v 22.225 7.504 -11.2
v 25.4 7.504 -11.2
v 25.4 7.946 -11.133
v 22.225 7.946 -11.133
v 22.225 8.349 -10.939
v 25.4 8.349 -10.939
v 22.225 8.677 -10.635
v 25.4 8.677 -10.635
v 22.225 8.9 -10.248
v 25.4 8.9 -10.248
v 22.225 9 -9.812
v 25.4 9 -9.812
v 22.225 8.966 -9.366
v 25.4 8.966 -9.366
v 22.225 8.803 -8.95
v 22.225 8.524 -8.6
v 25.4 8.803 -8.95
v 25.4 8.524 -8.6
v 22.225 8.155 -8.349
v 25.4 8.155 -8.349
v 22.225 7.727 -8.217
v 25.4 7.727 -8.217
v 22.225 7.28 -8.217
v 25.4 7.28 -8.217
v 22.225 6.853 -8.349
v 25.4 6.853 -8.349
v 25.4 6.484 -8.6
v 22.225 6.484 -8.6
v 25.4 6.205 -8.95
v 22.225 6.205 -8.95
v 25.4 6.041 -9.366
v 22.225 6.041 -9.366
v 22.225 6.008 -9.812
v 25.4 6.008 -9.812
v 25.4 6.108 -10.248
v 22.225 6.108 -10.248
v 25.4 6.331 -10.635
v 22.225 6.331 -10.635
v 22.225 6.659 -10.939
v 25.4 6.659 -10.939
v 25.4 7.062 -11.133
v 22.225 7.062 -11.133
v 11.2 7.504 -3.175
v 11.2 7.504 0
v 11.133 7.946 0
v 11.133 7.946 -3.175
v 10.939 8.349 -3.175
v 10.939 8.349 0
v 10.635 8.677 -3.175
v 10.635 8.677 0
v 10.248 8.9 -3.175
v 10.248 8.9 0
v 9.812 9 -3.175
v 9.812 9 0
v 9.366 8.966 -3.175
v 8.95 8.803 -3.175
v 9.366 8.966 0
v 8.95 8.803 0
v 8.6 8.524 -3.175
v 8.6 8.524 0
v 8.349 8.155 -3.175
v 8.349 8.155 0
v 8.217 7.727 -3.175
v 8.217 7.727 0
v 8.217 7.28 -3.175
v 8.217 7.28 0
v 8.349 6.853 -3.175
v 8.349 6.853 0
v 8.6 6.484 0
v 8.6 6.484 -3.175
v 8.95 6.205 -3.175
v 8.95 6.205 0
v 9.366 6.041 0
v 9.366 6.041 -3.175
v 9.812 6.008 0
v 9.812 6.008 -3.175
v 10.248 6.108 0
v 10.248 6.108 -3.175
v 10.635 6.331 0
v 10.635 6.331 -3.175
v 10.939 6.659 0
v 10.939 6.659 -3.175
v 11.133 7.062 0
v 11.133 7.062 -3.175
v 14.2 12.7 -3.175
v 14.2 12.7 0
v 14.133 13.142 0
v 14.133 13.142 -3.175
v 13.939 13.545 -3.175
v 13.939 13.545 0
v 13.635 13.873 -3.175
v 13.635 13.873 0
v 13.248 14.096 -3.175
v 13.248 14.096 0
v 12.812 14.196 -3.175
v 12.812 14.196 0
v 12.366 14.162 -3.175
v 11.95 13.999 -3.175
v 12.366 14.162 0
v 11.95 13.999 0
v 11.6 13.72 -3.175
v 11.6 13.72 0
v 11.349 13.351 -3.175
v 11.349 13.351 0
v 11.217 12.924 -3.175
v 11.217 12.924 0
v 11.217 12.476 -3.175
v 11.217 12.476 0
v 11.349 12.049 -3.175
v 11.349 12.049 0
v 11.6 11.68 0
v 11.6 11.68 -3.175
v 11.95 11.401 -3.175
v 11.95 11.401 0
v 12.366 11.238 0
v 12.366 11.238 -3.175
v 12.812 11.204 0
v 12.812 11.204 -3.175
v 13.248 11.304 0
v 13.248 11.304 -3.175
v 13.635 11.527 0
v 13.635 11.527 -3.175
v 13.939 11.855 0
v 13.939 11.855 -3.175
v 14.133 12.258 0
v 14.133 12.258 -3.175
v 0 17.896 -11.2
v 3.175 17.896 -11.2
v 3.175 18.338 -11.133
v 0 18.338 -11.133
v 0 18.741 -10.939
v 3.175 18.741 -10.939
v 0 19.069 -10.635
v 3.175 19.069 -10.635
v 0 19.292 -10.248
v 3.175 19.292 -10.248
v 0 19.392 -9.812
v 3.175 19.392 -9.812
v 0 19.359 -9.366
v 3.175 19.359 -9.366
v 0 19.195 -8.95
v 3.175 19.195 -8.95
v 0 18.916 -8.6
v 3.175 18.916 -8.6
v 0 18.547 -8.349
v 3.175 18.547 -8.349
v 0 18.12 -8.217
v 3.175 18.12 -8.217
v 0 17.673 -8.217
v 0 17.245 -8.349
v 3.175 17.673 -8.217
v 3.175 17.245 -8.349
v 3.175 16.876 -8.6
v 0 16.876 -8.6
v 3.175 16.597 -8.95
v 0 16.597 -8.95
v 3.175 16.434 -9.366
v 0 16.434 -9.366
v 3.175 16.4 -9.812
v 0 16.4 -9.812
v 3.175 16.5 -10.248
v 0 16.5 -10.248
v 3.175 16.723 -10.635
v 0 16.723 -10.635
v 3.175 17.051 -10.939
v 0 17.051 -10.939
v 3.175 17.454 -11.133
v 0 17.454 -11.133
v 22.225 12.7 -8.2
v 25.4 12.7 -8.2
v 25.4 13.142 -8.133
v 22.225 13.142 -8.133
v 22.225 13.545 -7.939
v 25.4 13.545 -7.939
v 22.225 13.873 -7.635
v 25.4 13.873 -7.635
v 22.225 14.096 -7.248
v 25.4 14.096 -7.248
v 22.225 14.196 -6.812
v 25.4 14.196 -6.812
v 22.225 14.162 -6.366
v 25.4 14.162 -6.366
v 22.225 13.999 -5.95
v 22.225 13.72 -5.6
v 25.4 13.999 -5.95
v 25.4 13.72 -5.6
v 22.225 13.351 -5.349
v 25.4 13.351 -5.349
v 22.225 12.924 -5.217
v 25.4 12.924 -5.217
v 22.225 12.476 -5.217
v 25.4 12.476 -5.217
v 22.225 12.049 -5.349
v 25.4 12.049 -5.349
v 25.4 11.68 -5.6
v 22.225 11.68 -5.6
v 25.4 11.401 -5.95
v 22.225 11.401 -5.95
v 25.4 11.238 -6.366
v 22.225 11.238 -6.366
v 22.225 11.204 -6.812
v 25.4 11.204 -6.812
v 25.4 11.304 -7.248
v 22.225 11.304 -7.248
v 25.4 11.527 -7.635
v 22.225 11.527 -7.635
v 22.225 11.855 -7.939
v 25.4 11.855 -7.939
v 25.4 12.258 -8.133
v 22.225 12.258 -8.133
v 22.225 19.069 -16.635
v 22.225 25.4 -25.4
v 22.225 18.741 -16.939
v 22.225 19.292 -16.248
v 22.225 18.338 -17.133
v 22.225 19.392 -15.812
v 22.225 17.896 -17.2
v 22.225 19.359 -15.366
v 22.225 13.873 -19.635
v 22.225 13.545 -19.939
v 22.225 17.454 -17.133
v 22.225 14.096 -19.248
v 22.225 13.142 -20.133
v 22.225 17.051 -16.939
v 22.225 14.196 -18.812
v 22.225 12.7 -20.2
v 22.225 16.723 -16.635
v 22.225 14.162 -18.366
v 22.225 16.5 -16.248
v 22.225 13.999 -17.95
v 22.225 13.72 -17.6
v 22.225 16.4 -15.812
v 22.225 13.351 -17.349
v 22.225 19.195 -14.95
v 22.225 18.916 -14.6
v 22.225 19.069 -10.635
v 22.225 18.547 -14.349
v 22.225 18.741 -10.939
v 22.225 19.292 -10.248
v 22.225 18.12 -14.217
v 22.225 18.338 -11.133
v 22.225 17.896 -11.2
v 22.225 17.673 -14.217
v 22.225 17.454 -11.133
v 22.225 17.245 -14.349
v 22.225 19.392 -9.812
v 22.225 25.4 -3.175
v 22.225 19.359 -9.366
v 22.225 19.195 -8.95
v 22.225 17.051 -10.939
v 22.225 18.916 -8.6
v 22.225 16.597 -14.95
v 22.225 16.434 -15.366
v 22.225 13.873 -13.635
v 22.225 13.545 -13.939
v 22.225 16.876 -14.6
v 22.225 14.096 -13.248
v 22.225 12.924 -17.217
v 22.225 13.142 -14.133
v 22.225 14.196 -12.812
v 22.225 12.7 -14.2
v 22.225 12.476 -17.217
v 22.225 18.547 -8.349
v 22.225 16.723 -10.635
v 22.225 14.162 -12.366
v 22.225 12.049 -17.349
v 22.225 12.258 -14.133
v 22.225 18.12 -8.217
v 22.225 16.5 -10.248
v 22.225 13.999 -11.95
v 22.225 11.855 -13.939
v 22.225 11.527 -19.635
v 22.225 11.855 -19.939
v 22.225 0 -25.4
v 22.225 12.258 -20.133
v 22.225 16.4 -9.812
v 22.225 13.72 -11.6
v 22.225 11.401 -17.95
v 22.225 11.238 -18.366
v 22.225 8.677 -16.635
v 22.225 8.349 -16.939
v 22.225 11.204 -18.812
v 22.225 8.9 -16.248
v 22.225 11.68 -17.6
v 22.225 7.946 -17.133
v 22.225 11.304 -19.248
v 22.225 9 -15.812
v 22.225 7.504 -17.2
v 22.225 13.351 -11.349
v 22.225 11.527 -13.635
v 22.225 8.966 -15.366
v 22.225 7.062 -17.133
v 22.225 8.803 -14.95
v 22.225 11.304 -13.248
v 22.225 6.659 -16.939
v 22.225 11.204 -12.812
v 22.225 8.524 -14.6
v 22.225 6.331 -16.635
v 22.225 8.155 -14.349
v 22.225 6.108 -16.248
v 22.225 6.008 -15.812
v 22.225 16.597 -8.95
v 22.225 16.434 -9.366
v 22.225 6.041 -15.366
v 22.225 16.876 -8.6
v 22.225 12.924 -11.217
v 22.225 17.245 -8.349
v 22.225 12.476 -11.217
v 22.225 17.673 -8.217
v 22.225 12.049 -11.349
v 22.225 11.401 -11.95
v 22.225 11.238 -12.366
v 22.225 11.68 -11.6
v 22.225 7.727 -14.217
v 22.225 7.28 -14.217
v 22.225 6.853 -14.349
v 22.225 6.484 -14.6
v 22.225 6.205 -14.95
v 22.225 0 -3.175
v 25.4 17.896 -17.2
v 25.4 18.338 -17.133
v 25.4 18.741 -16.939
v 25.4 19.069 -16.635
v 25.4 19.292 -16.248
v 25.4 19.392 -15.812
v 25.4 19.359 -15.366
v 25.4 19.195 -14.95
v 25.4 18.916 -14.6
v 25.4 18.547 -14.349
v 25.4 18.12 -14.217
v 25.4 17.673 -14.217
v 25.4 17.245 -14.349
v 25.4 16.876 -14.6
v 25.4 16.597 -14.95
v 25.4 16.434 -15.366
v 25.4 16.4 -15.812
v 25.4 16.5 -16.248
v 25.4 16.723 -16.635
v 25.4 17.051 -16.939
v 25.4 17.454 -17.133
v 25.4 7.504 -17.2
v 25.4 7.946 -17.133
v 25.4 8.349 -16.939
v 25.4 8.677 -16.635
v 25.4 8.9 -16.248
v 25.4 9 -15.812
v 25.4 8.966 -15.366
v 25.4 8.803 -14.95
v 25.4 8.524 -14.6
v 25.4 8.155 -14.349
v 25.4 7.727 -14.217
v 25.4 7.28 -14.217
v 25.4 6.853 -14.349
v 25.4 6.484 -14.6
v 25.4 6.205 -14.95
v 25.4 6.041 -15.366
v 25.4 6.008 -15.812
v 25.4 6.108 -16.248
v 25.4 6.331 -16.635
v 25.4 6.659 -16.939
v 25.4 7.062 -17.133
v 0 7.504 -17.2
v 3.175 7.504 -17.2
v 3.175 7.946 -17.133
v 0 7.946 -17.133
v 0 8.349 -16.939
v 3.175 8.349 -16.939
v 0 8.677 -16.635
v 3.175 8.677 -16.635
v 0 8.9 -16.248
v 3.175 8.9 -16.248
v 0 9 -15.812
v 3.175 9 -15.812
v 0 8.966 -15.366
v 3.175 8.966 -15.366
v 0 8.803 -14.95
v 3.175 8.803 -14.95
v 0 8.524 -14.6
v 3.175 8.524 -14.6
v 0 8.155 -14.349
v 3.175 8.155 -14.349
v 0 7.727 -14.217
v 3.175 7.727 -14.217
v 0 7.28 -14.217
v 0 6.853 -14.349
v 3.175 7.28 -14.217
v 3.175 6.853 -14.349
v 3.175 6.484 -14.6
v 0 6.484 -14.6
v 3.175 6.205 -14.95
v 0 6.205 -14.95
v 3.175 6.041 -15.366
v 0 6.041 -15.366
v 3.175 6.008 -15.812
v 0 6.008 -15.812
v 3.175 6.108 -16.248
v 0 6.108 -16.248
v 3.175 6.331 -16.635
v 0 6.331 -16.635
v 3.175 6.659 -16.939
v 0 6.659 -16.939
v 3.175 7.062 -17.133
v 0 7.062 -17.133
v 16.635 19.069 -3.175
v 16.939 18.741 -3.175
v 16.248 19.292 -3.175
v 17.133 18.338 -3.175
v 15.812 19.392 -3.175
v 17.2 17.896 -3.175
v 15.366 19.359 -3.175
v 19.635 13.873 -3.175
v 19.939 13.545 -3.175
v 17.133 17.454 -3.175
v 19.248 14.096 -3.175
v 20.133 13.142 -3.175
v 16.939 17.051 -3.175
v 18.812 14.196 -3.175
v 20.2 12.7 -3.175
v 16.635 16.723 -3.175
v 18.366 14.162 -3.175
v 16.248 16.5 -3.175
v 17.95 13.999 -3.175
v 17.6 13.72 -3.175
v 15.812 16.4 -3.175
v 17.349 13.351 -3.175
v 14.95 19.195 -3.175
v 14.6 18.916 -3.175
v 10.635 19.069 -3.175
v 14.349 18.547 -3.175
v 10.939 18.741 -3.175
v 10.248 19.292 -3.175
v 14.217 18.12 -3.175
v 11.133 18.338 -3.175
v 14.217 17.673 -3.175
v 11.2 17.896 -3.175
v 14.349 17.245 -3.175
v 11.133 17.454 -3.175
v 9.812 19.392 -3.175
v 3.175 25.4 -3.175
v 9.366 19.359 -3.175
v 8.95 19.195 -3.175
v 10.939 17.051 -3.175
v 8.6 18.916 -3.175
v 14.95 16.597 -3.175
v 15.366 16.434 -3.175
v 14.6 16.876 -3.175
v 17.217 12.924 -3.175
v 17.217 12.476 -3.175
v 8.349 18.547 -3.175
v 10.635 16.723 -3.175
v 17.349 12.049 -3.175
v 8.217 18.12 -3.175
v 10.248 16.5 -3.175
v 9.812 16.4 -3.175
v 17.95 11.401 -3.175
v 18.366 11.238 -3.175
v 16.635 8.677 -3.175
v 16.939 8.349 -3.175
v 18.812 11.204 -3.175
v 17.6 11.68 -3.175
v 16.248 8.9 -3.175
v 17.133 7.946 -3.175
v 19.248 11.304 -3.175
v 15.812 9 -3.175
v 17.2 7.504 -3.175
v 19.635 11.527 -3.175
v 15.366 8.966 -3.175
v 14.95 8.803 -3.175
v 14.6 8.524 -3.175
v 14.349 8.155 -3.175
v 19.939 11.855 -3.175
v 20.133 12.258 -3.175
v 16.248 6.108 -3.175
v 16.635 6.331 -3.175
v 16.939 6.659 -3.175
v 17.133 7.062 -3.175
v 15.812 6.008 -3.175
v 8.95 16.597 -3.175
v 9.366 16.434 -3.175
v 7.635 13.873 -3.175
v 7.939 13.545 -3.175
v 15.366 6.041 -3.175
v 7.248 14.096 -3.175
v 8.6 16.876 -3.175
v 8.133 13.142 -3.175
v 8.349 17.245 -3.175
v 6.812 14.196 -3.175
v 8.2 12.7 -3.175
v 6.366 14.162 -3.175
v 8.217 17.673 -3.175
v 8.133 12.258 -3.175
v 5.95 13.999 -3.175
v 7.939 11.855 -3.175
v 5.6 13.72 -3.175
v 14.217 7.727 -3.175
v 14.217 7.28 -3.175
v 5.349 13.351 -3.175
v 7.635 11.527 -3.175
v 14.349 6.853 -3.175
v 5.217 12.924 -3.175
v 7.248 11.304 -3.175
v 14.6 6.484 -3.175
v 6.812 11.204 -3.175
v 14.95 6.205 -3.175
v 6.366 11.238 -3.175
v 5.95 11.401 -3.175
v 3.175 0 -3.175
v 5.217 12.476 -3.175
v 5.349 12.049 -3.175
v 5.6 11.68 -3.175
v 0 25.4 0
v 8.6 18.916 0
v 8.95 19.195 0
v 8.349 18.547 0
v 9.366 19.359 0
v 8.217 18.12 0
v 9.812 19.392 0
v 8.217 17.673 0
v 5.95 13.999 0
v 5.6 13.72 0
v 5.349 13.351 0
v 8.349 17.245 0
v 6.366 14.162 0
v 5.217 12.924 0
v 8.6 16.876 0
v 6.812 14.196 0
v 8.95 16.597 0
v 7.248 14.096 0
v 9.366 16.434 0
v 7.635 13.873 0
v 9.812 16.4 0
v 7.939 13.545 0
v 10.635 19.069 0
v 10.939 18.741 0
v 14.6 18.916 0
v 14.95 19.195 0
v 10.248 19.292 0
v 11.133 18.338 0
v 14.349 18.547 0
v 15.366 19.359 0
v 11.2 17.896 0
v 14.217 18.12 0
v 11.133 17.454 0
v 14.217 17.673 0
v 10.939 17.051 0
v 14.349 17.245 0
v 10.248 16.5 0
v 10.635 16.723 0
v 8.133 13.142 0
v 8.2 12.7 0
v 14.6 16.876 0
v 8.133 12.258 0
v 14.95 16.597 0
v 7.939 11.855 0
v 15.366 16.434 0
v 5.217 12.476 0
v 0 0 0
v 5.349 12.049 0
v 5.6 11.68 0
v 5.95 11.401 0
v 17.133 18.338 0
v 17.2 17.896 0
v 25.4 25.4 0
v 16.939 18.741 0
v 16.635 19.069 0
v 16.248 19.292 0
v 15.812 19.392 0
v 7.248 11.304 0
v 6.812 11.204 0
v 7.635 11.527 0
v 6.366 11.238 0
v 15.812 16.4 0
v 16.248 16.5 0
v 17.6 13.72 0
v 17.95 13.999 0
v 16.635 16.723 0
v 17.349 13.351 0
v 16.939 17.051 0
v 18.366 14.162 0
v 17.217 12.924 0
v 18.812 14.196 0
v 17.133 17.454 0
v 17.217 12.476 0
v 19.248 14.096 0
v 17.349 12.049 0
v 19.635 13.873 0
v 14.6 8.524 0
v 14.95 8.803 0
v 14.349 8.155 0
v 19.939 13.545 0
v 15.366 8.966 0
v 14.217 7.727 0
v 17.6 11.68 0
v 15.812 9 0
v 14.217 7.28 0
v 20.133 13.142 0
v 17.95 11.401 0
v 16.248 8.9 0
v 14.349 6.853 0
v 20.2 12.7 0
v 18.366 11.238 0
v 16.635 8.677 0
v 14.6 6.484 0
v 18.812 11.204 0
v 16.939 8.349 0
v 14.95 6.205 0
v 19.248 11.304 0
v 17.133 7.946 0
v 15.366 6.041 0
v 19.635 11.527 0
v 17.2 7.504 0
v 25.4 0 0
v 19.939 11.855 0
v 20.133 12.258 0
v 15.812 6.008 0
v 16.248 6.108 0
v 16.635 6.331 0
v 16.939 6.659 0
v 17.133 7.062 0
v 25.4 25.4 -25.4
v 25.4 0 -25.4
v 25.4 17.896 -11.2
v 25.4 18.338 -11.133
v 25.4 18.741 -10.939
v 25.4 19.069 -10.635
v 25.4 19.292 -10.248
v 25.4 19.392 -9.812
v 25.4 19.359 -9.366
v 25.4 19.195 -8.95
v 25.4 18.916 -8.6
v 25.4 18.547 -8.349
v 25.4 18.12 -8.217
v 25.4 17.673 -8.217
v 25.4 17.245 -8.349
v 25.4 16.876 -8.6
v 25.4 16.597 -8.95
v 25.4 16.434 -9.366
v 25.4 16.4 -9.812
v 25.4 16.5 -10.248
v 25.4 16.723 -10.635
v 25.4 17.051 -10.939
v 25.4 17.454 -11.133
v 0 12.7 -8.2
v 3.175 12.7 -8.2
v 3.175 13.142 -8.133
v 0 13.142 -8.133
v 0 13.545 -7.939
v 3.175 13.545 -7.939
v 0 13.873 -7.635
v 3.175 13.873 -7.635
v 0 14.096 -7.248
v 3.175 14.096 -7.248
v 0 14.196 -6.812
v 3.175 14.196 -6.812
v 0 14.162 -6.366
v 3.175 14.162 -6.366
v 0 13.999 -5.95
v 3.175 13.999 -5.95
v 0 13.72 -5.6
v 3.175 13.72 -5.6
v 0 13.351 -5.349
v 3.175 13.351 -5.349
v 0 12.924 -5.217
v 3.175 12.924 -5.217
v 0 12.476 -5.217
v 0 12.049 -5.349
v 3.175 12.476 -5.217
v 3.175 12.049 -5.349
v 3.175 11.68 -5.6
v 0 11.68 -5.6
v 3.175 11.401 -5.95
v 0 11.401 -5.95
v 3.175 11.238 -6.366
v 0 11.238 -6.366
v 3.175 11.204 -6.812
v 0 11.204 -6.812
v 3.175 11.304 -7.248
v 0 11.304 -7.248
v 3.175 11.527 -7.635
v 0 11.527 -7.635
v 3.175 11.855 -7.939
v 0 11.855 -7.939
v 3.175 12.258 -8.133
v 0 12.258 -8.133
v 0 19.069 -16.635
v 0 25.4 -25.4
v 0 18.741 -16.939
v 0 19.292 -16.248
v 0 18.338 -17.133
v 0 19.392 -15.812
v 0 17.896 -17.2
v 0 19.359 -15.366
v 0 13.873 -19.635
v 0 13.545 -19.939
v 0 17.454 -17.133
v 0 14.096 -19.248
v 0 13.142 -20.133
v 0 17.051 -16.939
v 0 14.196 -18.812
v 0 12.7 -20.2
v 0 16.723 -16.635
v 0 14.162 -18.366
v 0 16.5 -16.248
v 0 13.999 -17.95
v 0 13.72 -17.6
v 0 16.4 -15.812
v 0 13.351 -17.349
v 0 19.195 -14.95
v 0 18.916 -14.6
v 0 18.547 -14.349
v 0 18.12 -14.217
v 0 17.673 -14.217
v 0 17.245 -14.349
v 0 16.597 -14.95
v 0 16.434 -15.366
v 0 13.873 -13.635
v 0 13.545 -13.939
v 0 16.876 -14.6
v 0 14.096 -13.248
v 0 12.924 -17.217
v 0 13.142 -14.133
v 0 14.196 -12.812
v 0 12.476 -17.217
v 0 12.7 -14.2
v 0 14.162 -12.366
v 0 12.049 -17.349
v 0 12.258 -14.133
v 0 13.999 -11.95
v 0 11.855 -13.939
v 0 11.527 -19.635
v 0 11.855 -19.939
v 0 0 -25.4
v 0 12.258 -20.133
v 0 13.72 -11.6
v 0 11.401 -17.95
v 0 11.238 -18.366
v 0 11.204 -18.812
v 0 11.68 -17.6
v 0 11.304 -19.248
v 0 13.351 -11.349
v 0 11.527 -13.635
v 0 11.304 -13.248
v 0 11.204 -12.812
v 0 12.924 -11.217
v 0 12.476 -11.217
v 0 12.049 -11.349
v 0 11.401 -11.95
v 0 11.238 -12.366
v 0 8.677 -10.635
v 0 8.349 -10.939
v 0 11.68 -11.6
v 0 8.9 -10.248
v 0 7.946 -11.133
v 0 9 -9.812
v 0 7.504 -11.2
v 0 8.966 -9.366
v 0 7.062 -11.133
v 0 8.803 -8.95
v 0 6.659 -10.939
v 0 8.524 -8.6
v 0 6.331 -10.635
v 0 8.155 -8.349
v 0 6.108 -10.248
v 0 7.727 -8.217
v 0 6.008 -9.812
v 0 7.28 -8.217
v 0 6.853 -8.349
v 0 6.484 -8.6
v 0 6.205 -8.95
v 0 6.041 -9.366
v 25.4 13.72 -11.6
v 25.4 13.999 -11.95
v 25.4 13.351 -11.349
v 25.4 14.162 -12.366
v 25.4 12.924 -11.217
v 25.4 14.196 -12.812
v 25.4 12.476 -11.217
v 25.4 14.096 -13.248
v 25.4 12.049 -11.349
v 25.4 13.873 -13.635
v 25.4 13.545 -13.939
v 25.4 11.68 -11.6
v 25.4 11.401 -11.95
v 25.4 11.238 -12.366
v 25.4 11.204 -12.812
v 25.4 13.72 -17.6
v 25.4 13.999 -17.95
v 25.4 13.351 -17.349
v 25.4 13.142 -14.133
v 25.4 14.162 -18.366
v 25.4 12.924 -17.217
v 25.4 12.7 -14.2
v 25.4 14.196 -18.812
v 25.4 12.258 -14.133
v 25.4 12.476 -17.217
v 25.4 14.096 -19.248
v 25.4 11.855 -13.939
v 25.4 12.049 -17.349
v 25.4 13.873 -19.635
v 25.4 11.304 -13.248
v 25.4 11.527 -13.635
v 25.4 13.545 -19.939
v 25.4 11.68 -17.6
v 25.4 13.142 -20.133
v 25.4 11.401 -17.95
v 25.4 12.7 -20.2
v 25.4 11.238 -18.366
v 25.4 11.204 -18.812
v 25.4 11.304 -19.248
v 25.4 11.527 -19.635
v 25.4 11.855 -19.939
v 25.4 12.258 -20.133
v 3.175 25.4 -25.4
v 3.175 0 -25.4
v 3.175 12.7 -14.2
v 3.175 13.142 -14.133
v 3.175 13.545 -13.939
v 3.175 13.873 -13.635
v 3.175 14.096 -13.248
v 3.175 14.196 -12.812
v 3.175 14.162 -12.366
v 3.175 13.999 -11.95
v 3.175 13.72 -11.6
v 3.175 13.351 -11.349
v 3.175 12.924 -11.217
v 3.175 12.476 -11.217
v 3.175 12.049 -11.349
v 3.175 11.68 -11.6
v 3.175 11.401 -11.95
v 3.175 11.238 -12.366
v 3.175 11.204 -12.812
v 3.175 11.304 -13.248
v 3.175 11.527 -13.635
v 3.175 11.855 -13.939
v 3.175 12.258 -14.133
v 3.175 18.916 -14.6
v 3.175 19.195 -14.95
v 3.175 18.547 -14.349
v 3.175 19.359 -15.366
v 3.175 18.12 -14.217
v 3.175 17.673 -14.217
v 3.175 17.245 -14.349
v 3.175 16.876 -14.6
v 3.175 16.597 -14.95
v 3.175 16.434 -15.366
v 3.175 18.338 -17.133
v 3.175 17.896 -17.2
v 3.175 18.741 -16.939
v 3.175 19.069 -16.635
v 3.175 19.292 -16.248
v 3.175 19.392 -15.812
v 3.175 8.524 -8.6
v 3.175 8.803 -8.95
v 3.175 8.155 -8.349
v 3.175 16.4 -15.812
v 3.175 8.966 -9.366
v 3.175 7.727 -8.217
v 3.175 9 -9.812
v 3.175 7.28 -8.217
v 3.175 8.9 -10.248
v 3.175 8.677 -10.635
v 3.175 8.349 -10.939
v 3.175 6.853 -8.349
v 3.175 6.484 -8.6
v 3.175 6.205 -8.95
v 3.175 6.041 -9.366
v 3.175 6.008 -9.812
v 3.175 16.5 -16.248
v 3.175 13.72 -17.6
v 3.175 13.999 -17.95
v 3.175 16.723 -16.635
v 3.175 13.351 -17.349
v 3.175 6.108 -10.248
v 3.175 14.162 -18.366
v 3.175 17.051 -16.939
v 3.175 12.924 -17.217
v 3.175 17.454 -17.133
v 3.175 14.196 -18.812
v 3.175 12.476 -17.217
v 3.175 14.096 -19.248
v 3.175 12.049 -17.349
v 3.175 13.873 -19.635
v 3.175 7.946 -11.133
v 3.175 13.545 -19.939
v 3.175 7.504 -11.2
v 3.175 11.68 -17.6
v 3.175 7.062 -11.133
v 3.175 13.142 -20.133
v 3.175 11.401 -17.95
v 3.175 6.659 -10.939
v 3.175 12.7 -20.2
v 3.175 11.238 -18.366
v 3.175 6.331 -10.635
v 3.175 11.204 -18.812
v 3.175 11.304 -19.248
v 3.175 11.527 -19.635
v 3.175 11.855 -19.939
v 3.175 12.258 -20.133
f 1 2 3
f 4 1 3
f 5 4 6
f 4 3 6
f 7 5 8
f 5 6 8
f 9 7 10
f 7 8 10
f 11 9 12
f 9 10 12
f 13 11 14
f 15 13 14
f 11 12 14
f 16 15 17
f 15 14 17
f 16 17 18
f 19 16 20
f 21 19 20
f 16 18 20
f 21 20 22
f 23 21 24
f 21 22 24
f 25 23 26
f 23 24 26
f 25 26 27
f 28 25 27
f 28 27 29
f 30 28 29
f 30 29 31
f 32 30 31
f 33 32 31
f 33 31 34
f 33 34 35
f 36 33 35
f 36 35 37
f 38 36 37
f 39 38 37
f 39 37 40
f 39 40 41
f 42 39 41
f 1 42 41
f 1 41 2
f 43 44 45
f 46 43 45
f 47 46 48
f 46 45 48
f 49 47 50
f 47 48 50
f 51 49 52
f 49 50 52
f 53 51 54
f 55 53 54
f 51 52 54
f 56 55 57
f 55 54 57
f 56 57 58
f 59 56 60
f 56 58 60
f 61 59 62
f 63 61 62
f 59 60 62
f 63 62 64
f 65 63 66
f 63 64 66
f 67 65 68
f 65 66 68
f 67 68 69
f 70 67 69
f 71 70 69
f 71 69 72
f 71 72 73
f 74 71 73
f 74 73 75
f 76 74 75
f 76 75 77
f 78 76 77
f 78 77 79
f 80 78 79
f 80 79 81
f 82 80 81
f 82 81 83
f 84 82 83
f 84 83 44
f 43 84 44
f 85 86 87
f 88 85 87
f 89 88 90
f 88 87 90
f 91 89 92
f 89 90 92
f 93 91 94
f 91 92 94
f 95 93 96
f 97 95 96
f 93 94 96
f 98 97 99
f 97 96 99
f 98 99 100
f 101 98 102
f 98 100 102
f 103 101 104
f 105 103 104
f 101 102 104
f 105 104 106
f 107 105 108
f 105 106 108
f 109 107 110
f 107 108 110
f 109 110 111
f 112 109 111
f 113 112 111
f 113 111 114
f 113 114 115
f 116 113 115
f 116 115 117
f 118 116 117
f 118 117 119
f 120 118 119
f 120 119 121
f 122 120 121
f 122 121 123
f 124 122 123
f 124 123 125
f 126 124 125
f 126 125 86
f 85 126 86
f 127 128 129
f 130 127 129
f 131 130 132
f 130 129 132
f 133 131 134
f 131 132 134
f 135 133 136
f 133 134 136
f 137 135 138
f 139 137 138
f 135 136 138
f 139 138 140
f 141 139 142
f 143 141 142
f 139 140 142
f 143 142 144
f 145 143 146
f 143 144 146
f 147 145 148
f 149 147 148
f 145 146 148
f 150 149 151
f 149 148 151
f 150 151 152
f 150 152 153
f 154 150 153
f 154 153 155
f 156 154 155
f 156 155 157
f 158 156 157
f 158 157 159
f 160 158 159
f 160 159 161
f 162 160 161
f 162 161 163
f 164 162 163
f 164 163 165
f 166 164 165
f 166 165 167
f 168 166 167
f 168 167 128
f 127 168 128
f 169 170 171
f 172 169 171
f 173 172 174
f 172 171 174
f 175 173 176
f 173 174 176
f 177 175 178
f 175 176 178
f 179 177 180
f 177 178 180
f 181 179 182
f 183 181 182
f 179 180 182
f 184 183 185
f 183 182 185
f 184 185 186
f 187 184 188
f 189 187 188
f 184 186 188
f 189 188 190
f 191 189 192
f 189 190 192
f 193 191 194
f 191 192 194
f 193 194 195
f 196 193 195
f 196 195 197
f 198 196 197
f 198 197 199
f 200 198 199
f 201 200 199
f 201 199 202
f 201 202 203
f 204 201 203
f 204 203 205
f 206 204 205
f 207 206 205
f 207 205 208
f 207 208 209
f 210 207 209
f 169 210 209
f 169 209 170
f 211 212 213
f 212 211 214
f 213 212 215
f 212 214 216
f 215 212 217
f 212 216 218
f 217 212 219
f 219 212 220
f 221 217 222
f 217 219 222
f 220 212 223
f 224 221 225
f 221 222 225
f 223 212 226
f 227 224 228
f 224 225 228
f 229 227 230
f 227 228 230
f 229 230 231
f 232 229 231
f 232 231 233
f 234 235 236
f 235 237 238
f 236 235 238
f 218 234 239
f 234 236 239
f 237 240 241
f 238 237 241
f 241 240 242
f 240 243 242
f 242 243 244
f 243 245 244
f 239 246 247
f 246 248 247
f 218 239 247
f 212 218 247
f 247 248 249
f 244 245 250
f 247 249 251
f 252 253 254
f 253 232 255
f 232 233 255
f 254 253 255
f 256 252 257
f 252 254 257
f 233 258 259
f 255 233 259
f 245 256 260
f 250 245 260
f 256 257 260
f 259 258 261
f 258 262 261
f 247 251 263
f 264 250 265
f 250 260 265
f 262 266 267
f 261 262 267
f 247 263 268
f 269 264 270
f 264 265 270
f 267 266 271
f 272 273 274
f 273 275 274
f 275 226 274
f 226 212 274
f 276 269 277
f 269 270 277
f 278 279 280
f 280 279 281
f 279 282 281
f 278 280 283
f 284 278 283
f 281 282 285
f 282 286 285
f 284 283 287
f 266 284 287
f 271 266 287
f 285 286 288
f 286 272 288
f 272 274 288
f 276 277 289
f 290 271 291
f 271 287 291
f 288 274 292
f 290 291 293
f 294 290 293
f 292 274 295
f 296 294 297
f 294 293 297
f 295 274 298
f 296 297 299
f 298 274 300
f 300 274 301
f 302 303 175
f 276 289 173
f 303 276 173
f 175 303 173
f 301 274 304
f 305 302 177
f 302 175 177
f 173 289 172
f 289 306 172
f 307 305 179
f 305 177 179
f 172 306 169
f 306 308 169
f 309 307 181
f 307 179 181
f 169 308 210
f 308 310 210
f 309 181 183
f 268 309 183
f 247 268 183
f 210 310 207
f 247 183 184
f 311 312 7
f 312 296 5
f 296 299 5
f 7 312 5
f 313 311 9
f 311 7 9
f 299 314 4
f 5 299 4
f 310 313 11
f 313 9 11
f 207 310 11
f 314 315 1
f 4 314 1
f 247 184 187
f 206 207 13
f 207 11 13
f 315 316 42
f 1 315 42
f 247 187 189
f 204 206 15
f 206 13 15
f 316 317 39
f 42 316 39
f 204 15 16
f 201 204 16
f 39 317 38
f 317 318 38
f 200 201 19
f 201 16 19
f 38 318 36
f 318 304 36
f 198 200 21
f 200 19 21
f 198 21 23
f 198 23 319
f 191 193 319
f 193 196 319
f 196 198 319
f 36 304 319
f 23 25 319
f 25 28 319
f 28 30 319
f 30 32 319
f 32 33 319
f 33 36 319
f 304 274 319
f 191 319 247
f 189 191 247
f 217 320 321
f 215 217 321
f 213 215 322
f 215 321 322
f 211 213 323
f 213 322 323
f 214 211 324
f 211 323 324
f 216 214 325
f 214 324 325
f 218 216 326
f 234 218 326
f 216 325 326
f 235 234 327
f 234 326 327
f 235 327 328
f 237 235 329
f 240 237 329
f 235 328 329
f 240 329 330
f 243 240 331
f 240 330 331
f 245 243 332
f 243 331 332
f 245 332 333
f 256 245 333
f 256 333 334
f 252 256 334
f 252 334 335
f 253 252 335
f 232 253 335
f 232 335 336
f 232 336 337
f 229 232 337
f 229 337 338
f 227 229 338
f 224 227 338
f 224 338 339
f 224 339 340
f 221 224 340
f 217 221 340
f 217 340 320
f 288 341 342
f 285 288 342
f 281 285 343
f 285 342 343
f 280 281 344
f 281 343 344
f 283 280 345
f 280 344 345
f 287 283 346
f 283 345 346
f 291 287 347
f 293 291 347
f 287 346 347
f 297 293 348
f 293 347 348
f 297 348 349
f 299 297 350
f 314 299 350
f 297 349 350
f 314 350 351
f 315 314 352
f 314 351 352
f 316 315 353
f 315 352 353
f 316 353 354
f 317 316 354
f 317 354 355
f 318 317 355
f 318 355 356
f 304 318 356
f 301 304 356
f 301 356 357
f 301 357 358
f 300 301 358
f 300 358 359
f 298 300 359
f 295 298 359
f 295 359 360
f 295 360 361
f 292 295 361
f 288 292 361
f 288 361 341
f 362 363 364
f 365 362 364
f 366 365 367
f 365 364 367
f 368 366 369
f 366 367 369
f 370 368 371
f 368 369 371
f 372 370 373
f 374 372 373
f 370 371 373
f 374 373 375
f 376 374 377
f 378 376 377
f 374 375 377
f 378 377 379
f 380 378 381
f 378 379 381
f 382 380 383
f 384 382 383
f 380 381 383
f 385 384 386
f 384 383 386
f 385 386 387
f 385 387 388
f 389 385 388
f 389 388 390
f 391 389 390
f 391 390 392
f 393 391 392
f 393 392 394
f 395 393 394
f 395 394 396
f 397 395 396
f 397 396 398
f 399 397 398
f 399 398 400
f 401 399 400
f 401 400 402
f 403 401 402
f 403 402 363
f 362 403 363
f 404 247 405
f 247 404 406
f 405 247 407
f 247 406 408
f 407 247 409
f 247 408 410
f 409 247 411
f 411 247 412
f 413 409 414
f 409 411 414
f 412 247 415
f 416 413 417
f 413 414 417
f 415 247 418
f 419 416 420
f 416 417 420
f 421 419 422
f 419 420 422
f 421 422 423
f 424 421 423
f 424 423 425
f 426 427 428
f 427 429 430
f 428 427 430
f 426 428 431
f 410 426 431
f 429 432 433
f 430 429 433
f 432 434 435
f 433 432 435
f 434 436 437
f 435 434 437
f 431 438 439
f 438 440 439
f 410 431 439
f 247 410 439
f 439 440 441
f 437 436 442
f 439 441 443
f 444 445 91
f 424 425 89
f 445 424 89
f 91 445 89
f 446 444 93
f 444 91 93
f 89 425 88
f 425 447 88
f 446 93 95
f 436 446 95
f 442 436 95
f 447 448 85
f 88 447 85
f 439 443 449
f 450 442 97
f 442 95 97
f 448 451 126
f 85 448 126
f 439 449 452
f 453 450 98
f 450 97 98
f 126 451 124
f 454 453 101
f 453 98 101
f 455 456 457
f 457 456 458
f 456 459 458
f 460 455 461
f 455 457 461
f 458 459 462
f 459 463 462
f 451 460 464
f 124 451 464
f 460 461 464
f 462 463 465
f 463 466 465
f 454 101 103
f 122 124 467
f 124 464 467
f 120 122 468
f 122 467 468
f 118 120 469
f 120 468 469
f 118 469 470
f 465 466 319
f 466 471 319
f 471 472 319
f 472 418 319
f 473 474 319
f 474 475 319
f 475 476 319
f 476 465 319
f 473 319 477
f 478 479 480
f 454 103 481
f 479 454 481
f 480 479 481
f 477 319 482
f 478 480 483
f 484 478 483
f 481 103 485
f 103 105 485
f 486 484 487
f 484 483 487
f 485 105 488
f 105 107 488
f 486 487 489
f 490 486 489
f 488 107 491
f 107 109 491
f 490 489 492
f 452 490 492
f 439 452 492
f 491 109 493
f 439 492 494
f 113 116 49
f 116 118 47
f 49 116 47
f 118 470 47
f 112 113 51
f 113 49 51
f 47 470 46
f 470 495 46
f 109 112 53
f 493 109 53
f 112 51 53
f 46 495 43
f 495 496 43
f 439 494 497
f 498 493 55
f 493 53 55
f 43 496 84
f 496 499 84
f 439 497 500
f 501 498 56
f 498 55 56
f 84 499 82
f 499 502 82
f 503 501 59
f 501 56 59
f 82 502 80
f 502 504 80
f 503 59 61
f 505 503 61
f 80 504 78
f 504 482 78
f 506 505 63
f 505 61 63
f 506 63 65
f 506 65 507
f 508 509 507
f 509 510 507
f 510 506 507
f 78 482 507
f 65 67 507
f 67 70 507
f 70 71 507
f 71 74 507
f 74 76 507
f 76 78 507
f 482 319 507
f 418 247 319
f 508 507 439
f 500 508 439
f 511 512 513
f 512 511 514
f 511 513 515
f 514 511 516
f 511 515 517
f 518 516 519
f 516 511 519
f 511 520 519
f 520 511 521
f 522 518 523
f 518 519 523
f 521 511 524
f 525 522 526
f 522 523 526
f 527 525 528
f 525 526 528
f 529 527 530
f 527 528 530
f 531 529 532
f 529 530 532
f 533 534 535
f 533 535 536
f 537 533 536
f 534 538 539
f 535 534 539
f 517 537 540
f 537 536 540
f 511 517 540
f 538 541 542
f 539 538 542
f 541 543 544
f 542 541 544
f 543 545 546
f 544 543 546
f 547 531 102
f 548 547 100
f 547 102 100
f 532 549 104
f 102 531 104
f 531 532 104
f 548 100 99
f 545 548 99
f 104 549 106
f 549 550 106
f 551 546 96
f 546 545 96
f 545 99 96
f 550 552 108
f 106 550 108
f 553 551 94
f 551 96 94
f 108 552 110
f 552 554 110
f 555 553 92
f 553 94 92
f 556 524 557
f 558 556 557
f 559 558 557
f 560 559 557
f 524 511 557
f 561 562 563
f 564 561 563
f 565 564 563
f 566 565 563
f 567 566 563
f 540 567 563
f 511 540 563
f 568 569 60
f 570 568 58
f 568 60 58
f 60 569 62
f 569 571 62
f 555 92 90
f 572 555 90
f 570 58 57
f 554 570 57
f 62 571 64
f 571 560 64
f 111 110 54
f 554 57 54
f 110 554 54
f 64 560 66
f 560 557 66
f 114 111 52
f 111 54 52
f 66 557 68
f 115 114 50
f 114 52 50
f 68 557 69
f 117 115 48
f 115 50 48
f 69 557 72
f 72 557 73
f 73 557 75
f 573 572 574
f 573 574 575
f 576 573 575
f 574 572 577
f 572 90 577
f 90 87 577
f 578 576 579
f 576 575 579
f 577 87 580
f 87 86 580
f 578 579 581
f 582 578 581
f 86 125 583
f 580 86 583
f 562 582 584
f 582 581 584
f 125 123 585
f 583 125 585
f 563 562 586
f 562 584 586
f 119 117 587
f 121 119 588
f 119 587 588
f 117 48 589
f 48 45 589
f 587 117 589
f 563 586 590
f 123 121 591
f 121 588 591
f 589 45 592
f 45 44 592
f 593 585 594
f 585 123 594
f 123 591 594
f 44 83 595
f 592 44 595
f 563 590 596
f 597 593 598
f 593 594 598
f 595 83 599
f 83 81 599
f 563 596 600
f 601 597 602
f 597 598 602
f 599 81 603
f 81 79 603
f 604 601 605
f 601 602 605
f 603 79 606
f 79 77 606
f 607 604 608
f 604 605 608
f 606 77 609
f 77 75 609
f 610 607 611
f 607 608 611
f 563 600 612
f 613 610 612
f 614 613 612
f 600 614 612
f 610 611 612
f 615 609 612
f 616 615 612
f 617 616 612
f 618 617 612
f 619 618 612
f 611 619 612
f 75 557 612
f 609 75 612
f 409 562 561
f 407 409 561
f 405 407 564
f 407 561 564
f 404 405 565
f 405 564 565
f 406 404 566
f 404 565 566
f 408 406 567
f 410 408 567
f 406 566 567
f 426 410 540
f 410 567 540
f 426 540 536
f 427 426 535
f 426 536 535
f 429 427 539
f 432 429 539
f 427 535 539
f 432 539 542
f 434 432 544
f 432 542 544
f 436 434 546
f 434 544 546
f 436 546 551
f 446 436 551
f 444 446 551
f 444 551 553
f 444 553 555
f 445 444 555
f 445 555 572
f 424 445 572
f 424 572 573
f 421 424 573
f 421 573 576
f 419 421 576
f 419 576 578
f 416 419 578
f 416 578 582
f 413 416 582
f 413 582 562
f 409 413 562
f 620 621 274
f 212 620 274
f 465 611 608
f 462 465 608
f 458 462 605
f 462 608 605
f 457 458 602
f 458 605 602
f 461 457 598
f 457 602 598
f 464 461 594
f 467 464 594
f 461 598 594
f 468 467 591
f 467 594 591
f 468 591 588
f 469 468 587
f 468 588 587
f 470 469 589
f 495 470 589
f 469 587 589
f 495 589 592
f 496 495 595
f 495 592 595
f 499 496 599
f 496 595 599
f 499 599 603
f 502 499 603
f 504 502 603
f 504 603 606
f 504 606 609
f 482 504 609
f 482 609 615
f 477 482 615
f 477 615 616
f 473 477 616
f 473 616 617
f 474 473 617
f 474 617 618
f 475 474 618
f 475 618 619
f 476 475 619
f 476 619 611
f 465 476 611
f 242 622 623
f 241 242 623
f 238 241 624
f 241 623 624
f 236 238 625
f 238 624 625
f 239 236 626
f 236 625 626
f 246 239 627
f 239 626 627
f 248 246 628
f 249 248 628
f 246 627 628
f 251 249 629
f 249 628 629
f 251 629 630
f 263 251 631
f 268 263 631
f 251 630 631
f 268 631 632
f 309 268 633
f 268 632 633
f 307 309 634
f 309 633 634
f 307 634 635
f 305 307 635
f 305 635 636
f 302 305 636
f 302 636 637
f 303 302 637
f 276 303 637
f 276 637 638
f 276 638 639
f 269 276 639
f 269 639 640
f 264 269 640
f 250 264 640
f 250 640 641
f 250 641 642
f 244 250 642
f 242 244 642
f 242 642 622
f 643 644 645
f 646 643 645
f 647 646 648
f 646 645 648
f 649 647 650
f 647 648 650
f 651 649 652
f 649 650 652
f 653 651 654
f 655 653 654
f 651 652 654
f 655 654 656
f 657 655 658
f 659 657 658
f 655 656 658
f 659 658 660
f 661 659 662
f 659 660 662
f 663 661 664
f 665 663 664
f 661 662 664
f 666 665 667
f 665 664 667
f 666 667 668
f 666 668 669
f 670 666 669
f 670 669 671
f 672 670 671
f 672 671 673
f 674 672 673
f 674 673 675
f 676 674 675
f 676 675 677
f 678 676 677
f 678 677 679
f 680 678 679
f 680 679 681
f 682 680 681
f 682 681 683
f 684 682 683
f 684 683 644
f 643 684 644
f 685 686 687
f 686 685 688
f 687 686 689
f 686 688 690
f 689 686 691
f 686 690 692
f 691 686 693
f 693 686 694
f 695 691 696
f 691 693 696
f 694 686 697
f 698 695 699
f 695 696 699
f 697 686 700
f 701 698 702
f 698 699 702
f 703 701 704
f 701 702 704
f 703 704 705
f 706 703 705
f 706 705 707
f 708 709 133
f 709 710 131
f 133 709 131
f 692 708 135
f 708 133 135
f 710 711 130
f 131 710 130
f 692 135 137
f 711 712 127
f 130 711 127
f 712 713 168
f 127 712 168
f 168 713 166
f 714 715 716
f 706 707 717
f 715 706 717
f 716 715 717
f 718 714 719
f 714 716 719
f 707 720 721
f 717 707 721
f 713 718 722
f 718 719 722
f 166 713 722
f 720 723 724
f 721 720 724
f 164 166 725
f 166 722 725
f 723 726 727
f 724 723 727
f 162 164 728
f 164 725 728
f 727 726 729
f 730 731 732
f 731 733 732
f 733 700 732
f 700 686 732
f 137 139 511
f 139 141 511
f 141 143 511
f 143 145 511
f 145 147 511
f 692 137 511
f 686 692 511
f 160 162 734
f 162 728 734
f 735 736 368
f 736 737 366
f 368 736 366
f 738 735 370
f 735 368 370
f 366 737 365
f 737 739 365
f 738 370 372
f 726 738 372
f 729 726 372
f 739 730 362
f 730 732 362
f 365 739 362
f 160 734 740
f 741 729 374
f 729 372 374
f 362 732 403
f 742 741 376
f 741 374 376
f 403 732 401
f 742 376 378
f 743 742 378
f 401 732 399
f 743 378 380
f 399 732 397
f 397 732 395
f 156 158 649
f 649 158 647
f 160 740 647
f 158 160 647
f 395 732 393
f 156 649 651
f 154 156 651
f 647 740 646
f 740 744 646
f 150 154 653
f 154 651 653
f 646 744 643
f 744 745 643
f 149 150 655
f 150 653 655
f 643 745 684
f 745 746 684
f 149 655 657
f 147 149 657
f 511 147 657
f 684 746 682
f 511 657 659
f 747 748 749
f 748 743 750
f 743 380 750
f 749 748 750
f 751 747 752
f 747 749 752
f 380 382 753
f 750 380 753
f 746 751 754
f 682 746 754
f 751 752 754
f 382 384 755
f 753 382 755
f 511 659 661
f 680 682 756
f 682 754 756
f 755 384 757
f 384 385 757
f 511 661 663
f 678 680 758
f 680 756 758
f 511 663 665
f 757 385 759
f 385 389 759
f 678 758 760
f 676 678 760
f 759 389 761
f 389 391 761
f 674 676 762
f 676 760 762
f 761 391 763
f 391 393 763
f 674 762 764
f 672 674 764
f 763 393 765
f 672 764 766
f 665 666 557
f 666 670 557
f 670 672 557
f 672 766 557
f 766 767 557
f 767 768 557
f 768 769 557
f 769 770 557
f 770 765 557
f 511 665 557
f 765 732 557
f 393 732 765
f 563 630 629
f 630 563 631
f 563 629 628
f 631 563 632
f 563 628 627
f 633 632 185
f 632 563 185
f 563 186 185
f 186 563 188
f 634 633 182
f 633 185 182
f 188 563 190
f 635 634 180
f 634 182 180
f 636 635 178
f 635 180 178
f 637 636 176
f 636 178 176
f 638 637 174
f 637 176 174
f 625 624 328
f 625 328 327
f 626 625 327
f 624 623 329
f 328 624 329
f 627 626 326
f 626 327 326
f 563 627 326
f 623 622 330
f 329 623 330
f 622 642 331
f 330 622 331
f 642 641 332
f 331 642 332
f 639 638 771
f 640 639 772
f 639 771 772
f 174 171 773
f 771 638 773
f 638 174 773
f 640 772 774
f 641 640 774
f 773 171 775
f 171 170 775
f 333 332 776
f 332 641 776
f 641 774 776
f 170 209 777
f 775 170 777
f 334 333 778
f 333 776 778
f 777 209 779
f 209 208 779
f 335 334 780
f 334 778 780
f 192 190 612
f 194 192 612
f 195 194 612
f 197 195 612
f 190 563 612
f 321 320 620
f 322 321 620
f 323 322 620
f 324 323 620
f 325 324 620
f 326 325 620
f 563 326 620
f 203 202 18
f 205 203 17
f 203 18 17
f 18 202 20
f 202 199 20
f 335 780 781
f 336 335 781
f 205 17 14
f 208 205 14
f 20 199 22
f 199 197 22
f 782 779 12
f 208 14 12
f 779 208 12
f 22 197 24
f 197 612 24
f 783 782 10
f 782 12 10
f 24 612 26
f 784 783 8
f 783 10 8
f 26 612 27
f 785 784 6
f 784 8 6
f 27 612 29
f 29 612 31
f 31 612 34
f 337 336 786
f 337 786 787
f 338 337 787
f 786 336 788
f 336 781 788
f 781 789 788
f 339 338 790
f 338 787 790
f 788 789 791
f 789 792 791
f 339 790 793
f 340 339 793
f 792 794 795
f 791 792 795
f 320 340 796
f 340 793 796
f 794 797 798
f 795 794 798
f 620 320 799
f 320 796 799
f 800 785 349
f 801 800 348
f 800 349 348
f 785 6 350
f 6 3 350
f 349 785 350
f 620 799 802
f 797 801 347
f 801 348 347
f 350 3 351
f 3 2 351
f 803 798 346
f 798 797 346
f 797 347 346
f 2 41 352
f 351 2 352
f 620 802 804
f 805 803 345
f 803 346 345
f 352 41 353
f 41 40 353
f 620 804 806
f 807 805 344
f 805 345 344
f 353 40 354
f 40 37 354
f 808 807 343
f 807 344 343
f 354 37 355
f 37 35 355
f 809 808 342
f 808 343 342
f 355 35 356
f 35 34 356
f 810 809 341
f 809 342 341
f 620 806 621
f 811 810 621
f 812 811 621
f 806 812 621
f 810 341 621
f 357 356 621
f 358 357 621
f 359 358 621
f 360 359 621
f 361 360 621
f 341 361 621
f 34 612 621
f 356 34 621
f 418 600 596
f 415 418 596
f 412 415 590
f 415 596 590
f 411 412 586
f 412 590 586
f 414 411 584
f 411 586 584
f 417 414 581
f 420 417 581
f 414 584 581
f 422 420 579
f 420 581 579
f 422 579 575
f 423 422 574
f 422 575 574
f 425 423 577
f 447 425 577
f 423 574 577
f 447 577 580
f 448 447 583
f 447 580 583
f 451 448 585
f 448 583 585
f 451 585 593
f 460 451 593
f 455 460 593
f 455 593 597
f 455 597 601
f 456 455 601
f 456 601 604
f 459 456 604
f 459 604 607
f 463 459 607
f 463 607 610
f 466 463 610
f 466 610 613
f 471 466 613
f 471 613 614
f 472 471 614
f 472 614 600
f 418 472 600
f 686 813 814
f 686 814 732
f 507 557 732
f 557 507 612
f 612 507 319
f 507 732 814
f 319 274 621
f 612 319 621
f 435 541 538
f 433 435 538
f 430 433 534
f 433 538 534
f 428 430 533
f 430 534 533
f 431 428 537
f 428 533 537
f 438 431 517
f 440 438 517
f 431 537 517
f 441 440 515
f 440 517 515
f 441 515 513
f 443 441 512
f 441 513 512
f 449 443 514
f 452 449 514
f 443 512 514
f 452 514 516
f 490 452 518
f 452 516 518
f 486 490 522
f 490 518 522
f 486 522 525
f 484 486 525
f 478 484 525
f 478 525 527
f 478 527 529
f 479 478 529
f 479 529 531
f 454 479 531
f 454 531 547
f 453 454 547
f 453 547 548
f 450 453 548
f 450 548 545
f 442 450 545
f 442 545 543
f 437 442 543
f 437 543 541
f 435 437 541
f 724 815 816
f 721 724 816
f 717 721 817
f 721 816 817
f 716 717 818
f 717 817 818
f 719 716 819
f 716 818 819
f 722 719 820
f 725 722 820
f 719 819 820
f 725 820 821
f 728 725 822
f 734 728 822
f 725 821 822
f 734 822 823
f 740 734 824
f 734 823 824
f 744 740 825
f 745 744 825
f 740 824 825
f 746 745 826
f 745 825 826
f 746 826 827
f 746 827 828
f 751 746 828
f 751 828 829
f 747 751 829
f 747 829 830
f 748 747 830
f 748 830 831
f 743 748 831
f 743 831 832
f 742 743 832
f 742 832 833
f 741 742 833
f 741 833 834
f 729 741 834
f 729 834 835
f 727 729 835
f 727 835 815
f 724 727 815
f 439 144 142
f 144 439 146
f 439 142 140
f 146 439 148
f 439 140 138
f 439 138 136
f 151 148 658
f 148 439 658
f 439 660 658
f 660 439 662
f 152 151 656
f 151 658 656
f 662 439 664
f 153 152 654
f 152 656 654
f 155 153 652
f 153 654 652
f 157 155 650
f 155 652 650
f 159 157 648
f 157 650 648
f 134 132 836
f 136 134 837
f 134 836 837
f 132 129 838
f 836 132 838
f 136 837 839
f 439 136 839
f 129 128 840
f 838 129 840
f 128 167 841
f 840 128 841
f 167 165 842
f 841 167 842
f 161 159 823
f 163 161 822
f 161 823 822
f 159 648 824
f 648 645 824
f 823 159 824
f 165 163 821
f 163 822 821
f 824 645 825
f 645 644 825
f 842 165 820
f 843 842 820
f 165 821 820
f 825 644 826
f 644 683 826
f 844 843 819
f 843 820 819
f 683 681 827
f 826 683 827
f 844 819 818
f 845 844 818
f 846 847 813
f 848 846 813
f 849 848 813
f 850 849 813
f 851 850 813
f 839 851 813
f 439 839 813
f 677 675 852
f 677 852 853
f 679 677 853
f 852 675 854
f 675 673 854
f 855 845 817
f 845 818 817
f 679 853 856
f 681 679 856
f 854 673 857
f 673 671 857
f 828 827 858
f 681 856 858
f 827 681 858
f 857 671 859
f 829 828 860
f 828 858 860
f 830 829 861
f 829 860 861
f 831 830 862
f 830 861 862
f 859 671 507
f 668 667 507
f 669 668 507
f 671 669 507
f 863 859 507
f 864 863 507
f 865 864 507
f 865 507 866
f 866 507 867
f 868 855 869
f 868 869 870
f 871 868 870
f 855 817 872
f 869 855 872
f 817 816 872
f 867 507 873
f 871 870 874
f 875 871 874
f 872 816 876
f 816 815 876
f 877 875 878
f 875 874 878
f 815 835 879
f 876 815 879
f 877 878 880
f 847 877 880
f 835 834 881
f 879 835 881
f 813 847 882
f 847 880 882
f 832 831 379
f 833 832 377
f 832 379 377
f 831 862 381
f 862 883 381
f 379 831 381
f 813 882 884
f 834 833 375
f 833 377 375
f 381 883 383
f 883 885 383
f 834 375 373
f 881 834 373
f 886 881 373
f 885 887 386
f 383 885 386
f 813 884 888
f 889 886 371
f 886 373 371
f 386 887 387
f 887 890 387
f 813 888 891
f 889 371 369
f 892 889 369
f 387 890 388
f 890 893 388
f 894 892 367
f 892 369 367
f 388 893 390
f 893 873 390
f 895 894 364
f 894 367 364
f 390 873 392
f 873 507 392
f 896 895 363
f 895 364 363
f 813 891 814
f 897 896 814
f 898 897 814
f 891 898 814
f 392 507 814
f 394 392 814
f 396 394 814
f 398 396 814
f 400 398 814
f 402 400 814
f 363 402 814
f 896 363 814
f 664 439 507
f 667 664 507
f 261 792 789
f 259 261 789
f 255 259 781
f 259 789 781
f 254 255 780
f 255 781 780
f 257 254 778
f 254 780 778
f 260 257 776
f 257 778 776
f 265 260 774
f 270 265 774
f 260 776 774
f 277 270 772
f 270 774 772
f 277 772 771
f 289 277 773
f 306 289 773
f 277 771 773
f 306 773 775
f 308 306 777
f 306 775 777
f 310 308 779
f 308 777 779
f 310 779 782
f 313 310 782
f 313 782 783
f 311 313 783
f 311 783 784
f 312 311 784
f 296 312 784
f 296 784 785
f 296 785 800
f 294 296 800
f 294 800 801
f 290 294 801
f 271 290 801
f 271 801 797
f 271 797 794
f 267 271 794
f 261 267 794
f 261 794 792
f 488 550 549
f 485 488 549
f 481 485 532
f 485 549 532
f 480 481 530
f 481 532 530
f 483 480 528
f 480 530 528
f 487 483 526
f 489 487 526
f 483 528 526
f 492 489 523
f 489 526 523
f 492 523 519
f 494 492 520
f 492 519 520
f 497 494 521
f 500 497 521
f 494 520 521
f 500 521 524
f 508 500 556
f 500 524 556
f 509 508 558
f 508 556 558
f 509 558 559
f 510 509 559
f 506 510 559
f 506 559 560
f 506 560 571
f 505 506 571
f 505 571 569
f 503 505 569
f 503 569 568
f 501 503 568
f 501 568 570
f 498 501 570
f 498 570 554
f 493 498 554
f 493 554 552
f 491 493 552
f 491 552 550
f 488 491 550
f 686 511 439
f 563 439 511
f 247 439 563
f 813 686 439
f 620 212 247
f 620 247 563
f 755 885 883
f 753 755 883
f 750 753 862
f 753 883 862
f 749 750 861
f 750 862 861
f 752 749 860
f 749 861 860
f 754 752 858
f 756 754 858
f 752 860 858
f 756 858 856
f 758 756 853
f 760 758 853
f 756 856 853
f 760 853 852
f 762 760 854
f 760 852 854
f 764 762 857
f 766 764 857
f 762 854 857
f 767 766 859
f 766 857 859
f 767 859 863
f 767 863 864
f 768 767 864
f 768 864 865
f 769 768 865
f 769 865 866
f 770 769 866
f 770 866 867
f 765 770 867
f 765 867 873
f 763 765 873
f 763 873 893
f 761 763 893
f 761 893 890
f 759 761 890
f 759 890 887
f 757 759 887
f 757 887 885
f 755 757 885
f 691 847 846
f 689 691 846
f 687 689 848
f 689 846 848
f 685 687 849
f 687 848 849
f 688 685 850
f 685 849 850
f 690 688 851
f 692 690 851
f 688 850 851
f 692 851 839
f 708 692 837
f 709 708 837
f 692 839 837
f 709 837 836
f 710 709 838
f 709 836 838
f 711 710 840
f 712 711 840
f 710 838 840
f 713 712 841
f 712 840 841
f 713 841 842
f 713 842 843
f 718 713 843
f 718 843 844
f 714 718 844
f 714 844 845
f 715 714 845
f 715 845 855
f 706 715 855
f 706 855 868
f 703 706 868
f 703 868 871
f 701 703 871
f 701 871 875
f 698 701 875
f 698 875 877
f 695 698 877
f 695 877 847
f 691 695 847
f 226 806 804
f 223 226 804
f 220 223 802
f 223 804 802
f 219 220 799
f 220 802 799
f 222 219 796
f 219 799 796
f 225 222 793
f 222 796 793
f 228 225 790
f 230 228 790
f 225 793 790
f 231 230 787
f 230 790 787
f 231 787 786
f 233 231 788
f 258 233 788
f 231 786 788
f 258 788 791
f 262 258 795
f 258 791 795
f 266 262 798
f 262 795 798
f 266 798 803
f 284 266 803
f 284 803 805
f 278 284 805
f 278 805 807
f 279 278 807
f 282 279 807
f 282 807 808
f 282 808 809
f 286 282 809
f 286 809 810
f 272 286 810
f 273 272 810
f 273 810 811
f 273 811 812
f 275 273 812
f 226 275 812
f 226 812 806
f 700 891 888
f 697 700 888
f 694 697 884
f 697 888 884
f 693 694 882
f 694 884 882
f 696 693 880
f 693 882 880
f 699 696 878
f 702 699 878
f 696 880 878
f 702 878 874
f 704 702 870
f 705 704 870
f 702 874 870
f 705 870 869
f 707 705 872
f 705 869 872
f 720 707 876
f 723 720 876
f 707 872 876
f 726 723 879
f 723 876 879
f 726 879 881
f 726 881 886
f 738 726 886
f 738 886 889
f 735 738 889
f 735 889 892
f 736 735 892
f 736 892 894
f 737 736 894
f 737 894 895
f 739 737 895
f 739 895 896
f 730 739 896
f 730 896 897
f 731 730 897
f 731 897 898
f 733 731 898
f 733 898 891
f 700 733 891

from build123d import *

# Parameters (mm, degrees)
BOSS_EXTRUDE1_DEPTH = 25.4
SKETCH3_R           = 1.5
CUT_EXTRUDE1_DEPTH  = 44.994090512
SKETCH4_R           = 1.5
CUT_EXTRUDE2_DEPTH  = 44.994090512


with BuildPart() as part:
    # Sketch2 → Boss-Extrude1 (new body)
    with BuildSketch(Plane(origin=(0, 0, 0), x_dir=(1, 0, 0), z_dir=(0, 1, 0))):
        Polygon((22.225, 3.175), (12.7, 3.175), (3.175, 3.175), (3.175, 25.4), (0, 25.4), (0, 0), (25.4, 0), (25.4, 25.4), (22.225, 25.4), align=None)
    extrude(amount=BOSS_EXTRUDE1_DEPTH)

    # Sketch3 → Cut-Extrude1 (cut, through all)
    with BuildSketch(Plane.XY):
        with Locations((12.7, 12.7)):
            Circle(SKETCH3_R)
        with Locations((6.7, 12.7)):
            Circle(SKETCH3_R)
        with Locations((9.7, 17.896152423)):
            Circle(SKETCH3_R)
        with Locations((15.7, 17.896152423)):
            Circle(SKETCH3_R)
        with Locations((18.7, 12.7)):
            Circle(SKETCH3_R)
        with Locations((15.7, 7.503847577)):
            Circle(SKETCH3_R)
        with Locations((9.7, 7.503847577)):
            Circle(SKETCH3_R)
    extrude(amount=-CUT_EXTRUDE1_DEPTH, mode=Mode.SUBTRACT)

    # Sketch4 → Cut-Extrude2 (cut, through all)
    with BuildSketch(Plane(origin=(25.4, 0, 0), x_dir=(0, 0, -1), z_dir=(1, 0, 0))):
        with Locations((12.7, 12.7)):
            Circle(SKETCH4_R)
        with Locations((6.7, 12.7)):
            Circle(SKETCH4_R)
        with Locations((9.7, 17.896152423)):
            Circle(SKETCH4_R)
        with Locations((15.7, 17.896152423)):
            Circle(SKETCH4_R)
        with Locations((18.7, 12.7)):
            Circle(SKETCH4_R)
        with Locations((15.7, 7.503847577)):
            Circle(SKETCH4_R)
        with Locations((9.7, 7.503847577)):
            Circle(SKETCH4_R)
    extrude(amount=-CUT_EXTRUDE2_DEPTH, mode=Mode.SUBTRACT)


solid = part.part
